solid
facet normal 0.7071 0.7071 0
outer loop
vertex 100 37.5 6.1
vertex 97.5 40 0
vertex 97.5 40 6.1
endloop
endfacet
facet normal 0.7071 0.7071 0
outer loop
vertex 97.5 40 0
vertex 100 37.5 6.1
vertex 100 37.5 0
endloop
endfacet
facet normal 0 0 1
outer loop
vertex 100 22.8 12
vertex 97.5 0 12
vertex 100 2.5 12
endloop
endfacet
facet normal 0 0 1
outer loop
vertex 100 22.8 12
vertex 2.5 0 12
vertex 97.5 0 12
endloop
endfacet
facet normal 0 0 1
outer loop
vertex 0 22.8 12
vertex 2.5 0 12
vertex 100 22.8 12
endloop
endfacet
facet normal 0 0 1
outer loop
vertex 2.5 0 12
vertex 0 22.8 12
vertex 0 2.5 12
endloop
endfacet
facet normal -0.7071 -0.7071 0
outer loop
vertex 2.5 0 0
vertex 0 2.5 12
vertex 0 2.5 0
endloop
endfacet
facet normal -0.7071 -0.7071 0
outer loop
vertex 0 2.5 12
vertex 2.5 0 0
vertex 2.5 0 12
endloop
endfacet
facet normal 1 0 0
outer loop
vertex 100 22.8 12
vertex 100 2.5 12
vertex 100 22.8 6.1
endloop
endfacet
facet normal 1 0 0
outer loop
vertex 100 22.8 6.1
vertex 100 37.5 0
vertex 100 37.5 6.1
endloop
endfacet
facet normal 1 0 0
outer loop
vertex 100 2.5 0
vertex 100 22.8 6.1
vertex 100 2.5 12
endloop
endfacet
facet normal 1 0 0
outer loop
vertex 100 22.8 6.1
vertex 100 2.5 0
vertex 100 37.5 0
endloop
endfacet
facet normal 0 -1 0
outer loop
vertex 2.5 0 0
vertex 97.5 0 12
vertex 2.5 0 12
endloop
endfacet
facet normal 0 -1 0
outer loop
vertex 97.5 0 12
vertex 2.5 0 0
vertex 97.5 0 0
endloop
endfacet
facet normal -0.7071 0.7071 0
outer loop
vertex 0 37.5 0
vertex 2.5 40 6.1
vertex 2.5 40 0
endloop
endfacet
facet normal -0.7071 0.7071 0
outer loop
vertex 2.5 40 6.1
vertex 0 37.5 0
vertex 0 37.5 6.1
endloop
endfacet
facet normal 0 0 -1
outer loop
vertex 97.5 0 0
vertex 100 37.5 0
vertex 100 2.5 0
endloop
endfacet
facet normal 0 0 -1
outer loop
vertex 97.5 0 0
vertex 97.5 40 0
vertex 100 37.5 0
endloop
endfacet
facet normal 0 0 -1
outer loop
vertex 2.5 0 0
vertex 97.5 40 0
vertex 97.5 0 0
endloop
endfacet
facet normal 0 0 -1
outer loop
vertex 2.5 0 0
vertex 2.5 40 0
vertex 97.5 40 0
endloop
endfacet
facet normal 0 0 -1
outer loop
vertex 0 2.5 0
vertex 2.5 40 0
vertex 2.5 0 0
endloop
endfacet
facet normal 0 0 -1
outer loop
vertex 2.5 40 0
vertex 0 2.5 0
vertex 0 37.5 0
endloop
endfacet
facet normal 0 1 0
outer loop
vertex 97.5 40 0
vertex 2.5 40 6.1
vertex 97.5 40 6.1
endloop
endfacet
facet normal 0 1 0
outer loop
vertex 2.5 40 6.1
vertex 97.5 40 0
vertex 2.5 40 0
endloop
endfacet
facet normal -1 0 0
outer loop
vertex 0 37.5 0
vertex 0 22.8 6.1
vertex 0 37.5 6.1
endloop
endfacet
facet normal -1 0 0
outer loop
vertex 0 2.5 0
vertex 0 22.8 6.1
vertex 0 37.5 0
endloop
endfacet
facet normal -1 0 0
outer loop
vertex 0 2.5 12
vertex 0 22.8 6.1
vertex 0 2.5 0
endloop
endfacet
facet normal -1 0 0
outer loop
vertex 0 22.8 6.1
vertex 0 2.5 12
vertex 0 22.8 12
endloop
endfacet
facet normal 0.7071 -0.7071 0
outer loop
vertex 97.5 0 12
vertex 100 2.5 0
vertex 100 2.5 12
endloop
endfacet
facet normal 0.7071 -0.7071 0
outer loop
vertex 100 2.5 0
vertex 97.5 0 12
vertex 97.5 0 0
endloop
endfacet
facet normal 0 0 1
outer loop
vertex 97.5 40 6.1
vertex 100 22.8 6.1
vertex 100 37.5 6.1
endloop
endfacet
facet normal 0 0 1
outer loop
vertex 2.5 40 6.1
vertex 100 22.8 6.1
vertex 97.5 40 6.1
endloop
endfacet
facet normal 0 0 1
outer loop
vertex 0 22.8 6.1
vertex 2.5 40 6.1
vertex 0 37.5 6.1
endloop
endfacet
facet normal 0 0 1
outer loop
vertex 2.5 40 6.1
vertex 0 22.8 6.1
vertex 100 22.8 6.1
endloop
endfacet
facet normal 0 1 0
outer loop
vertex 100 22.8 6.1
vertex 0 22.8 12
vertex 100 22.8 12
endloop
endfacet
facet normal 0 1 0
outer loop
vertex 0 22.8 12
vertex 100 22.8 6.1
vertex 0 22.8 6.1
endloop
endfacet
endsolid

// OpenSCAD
$fn = 32;

// ----------------------------------------------------------------------
// Stepped bar: sidestep, 100 x 40 x 12/6.1 mm
// ----------------------------------------------------------------------

// --- parameters (mm) ---
bar_l = 100;              // bar length, X
bar_w = 40;               // bar width, Y
plate_t = 12;             // thickness of the thick zone, Z
thin_t = 6.1;             // thickness of the thin zone
corner_c = 2.5;           // corner chamfer of the bar
step_cut = 5.9;           // material removed from the thin zone
ledge_y = 22.8;           // start of the ledge from the front edge
depth_1 = 5.9;            // depth of cut 1 from the top face
fit_tol = 0.05;           // declared fit tolerance (prompt contract)
free_tol = 0.2;           // declared free tolerance (prompt contract)

profile = [[2.5, 0], [97.5, 0], [100, 2.5], [100, 37.5], [97.5, 40], [2.5, 40], [0, 37.5], [0, 2.5]];  // primary outline, 8 points, counter clockwise
void_1 = [[-1, 22.8], [101, 22.8], [101, 41], [-1, 41]];  // ledge cut along one edge, 4 points

// --- the one profile operation ---
difference() {
  linear_extrude(height = plate_t) polygon(points = profile);
  translate([0, 0, plate_t - depth_1])
    linear_extrude(height = depth_1 + 1) polygon(points = void_1);
}
